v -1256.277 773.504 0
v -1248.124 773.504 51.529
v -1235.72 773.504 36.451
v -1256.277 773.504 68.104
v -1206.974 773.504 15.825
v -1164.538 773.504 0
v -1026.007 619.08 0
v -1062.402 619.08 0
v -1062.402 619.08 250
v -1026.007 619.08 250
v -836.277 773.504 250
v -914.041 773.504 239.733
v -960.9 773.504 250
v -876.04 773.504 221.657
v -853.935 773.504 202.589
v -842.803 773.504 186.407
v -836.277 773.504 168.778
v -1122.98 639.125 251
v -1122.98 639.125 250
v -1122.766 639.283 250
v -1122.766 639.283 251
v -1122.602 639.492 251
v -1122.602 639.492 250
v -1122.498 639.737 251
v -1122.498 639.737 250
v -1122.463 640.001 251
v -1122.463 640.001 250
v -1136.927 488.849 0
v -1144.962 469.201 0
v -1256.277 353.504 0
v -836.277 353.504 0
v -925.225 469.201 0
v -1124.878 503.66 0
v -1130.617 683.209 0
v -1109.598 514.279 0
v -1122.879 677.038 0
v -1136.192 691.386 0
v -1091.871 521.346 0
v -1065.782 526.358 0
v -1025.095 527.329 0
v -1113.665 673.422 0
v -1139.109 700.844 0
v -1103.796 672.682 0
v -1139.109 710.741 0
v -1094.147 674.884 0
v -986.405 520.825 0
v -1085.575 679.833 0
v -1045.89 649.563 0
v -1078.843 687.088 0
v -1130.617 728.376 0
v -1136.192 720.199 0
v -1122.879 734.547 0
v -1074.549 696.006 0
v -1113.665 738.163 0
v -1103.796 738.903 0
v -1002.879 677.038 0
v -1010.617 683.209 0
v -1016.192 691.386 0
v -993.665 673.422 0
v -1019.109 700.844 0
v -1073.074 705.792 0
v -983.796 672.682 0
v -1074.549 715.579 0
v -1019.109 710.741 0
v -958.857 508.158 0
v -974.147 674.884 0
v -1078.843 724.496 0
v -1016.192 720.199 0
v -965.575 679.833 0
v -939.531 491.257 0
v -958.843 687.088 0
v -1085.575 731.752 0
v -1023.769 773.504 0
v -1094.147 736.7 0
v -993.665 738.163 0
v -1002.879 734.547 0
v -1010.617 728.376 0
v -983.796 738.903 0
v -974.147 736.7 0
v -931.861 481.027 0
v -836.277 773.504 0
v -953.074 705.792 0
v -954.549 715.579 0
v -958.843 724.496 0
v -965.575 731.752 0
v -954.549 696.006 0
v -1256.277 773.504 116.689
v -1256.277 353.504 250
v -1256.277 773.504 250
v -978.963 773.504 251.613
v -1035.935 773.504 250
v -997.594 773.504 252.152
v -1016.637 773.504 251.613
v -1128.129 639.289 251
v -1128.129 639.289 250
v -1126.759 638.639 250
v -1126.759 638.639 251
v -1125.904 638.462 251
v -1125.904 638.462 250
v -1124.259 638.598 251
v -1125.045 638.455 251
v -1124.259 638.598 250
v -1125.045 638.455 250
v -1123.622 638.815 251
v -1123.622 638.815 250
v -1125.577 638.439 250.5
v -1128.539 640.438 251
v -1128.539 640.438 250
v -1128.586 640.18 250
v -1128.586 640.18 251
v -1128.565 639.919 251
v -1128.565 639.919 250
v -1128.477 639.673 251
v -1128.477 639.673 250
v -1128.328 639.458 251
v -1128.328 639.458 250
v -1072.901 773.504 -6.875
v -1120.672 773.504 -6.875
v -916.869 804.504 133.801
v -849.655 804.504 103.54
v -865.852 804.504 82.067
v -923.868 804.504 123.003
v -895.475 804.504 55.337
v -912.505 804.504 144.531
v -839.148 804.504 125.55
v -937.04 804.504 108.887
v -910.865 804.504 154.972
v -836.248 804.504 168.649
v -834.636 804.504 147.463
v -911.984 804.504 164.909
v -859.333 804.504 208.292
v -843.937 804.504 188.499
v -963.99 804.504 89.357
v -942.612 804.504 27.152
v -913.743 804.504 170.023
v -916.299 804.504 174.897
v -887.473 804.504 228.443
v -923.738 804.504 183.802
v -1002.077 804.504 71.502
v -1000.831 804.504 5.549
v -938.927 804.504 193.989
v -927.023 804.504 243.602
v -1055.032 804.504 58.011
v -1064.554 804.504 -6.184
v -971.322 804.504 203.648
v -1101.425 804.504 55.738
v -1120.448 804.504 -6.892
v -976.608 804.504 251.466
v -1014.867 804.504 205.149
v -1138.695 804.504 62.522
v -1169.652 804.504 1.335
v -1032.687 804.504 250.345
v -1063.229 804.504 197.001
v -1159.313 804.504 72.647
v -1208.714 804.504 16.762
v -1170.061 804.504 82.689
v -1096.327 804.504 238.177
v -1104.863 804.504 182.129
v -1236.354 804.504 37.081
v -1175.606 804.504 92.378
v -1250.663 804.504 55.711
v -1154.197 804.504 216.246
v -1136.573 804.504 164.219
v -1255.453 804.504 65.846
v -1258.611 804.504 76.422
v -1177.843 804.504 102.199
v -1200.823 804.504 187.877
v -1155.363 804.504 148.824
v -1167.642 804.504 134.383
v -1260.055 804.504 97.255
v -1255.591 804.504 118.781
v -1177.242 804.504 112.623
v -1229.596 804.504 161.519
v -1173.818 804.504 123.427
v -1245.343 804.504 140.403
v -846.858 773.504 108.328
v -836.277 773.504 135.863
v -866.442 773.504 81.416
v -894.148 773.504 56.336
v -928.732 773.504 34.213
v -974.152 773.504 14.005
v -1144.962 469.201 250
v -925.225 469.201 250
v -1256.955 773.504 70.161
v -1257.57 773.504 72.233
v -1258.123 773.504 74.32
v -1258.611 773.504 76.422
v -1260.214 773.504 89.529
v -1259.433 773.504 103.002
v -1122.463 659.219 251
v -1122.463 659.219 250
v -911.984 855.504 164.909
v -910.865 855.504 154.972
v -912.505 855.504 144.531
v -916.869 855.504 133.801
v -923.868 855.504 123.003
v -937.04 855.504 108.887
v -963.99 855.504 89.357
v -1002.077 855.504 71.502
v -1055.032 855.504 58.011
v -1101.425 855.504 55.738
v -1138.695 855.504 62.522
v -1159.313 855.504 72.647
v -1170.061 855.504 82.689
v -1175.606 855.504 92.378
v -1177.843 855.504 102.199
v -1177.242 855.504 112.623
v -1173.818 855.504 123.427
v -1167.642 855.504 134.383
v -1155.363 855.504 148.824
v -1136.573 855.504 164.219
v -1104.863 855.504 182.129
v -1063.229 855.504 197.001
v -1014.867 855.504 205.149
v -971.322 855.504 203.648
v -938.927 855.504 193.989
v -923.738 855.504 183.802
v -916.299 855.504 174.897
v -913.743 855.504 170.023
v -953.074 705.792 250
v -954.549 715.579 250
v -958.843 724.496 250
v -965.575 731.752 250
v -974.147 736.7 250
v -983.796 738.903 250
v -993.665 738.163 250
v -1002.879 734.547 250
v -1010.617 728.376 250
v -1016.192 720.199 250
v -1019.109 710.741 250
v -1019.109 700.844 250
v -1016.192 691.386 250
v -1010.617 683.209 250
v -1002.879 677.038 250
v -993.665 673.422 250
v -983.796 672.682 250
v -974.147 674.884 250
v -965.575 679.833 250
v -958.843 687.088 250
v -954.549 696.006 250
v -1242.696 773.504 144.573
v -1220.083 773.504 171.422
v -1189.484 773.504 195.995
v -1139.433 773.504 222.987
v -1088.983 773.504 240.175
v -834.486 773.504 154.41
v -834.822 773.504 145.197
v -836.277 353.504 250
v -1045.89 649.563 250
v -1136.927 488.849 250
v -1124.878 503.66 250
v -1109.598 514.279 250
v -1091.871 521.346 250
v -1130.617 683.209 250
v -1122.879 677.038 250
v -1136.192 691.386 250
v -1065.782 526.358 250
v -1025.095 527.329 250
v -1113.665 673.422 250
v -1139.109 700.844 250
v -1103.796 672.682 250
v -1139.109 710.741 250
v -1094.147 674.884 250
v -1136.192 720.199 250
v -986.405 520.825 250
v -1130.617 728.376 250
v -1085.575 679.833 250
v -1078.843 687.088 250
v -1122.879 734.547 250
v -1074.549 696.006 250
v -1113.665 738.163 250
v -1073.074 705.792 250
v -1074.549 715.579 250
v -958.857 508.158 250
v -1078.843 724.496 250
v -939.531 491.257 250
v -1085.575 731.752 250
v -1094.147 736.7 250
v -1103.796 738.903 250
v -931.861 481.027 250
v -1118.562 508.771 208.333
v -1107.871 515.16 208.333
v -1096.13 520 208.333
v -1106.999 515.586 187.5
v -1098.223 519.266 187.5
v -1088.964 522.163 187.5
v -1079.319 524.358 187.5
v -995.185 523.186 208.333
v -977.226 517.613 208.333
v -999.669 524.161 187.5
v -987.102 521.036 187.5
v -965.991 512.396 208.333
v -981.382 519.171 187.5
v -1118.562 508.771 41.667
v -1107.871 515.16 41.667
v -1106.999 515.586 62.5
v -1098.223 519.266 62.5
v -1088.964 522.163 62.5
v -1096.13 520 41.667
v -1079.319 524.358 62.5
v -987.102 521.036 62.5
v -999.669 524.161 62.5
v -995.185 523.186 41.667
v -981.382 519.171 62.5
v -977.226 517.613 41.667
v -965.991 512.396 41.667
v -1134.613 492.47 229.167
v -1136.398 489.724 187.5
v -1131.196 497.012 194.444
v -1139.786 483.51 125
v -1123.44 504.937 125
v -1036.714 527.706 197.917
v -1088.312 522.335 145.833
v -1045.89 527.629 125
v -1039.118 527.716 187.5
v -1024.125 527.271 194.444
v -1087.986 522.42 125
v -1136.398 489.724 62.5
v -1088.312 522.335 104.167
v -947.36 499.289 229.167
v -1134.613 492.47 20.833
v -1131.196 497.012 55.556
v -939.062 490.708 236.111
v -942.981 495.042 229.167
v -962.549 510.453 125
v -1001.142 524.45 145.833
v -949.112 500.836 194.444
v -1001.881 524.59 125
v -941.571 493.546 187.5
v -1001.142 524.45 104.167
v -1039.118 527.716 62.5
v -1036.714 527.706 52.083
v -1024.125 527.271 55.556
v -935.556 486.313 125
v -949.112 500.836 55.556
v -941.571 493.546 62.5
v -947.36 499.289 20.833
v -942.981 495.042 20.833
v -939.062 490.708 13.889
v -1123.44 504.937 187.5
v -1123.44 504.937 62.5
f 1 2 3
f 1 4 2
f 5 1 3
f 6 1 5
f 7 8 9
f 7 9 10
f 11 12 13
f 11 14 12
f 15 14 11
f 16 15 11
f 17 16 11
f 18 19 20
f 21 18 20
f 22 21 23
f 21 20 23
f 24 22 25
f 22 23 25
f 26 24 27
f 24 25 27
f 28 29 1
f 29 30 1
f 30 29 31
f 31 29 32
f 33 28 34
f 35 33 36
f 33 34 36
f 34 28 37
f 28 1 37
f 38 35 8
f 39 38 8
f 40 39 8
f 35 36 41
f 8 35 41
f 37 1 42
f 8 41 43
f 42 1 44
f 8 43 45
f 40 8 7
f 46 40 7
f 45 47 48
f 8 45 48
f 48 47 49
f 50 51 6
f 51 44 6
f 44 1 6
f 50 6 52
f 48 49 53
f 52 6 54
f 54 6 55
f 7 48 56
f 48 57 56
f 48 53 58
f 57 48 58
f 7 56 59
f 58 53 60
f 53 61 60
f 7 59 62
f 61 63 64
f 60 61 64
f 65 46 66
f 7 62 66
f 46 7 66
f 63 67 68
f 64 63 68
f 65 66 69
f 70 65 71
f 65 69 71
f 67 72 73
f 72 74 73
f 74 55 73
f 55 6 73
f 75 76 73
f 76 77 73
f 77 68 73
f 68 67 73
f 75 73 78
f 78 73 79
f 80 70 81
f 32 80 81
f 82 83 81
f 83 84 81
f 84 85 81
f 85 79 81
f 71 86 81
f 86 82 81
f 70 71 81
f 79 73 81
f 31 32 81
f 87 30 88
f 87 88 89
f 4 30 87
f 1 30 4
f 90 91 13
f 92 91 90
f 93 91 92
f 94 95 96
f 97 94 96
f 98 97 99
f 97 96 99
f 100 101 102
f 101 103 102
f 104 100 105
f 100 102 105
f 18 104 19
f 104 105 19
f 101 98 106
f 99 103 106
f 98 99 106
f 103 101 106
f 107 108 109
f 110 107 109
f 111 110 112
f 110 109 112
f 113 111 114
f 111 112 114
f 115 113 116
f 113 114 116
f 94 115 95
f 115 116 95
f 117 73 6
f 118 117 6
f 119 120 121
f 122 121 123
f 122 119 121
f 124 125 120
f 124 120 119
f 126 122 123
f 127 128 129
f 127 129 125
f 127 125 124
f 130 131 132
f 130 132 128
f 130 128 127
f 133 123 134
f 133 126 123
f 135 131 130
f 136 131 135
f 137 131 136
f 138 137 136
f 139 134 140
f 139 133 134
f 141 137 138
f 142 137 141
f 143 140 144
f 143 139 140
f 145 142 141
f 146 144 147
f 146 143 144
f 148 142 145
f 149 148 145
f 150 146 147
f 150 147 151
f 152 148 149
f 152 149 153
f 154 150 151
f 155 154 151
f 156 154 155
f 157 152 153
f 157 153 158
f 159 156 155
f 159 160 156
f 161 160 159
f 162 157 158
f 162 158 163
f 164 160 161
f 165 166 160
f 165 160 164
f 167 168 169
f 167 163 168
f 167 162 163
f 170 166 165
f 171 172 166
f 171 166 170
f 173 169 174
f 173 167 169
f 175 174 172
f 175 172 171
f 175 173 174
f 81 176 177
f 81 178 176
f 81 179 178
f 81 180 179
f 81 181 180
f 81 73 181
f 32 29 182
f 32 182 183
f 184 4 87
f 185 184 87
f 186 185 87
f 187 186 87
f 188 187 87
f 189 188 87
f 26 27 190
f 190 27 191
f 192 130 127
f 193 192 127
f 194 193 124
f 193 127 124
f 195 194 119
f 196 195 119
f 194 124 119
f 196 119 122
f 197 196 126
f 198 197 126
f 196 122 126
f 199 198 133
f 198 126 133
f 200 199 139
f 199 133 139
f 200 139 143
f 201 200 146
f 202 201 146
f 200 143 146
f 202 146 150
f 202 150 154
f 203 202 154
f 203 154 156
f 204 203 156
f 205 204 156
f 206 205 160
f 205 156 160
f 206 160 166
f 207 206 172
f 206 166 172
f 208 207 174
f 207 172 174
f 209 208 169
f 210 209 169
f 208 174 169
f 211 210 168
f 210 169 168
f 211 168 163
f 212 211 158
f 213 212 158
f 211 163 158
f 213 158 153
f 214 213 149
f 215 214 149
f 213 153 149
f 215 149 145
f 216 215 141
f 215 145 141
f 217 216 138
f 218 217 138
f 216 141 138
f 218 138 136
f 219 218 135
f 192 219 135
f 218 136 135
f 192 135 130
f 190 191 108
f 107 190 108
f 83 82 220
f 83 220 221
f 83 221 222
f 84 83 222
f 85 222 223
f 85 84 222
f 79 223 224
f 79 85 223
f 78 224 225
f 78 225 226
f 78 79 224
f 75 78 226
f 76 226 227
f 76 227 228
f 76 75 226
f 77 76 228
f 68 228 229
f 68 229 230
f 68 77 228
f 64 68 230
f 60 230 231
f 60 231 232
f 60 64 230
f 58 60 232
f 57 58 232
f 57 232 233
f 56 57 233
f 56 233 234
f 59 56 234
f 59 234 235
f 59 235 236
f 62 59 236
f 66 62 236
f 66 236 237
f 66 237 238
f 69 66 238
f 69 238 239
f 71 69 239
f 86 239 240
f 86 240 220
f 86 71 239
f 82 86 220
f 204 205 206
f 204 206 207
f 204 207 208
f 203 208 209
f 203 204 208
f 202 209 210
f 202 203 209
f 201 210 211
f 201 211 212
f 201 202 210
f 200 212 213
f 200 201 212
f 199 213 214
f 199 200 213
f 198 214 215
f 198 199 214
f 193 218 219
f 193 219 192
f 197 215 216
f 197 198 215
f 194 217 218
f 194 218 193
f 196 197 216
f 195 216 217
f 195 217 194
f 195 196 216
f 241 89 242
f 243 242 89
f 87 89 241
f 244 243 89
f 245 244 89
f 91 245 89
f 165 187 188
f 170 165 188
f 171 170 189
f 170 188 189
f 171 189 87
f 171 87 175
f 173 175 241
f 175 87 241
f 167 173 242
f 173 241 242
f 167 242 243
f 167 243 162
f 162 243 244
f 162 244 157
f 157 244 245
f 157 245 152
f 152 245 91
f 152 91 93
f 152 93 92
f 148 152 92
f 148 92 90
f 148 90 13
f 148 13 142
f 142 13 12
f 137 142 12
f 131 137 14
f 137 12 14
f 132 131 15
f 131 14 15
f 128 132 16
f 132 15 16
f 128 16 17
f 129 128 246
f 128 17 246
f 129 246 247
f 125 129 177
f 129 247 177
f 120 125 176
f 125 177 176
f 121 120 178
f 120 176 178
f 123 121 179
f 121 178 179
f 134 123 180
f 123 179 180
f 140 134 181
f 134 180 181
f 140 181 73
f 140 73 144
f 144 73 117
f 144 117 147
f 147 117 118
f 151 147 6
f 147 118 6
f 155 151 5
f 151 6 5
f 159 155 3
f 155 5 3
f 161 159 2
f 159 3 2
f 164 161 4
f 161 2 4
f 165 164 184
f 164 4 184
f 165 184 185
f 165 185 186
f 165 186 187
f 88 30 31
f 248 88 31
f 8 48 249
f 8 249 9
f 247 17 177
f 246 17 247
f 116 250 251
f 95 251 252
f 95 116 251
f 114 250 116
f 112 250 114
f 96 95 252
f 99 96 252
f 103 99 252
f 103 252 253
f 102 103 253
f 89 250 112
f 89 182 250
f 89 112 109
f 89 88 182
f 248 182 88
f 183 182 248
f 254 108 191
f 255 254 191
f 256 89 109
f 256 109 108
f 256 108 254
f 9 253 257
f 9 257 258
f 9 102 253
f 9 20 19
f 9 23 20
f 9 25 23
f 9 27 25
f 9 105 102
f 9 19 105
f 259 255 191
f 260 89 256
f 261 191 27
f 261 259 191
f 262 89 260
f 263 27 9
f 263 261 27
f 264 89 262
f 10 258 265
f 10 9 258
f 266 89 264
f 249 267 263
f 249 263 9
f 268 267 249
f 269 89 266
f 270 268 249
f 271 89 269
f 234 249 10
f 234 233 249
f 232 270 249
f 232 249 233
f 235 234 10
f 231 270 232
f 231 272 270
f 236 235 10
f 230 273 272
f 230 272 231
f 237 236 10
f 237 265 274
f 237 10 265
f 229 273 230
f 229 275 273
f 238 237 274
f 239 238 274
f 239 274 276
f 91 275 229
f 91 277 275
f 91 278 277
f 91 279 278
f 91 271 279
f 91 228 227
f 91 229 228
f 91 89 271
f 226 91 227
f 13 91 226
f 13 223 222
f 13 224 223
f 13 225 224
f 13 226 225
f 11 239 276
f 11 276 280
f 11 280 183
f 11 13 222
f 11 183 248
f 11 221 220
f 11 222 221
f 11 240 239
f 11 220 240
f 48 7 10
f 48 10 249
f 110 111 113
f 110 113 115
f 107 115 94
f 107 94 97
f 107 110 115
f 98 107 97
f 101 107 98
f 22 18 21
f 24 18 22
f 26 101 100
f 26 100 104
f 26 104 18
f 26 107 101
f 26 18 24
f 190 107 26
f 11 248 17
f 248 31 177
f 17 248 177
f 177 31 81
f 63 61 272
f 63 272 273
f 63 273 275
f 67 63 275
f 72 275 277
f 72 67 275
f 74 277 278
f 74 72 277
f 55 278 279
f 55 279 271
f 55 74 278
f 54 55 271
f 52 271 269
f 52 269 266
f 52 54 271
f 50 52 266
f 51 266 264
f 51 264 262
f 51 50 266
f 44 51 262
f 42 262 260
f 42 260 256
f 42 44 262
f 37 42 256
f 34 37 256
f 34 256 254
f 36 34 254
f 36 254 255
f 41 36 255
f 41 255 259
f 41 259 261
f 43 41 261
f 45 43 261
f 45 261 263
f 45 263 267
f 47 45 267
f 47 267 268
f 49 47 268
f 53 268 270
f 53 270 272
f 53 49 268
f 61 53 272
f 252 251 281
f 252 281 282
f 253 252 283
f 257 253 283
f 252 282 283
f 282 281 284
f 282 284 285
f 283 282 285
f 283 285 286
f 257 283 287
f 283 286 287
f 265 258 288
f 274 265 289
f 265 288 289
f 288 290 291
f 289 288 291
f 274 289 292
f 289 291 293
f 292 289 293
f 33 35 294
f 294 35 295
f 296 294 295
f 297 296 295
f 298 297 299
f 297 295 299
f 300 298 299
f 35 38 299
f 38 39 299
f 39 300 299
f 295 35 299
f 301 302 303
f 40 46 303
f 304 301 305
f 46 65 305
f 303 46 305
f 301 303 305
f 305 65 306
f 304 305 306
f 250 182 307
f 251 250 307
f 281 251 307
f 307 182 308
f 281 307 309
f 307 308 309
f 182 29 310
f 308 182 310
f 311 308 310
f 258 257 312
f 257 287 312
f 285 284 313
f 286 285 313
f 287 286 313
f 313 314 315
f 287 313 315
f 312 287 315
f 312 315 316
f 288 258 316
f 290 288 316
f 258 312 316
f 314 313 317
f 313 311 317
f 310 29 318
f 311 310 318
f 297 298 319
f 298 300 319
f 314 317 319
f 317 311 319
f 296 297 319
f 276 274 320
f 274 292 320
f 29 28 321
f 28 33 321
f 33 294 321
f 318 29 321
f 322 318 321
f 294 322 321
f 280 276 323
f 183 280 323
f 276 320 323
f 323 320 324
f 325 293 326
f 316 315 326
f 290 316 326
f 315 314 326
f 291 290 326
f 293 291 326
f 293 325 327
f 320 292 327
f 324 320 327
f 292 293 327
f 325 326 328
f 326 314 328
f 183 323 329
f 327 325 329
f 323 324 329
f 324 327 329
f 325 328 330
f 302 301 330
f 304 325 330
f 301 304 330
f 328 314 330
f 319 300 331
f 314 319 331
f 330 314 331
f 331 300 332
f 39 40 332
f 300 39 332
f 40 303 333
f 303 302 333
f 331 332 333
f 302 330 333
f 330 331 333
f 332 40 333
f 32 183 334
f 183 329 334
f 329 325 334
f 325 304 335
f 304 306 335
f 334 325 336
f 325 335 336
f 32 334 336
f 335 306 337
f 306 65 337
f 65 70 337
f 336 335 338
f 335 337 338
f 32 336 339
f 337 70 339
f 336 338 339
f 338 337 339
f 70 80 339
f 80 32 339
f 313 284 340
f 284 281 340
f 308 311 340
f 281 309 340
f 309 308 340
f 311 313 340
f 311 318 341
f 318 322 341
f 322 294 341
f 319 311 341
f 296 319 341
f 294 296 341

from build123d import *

# Parameters (mm, degrees)
SKETCH1_W           = 420
SKETCH1_H           = 420
SKETCH1_R           = 33.203133877
BOSS_EXTRUDE2_DEPTH = 250
BOSS_EXTRUDE3_DEPTH = 1
SKETCH4_RX          = 216.159218744
SKETCH4_RY          = 124.438636569
BOSS_EXTRUDE4_DEPTH = 31
SKETCH5_RX          = 136.808799133
SKETCH5_RY          = 69.0562156
BOSS_EXTRUDE5_DEPTH = 51


with BuildPart() as part:
    # Sketch1 → Boss-Extrude2 (new body)
    with BuildSketch(Plane.XY):
        with Locations((-1046.276969261, 563.504412843)):
            Rectangle(SKETCH1_W, SKETCH1_H)
        with Locations((-986.276969261, 705.792386227)):
            Circle(SKETCH1_R, mode=Mode.SUBTRACT)
        with Locations((-1106.276969261, 705.792386227)):
            Circle(SKETCH1_R, mode=Mode.SUBTRACT)
        Polygon((-1026.007137098, 619.07974314), (-1045.889944458, 649.563457617), (-1062.401956466, 619.07974314), align=None, mode=Mode.SUBTRACT)
        with BuildLine():
            Line((-1144.96201651, 469.201480292), (-925.225241317, 469.201480292))
            add(Edge.make_bspline(
                [(-1144.96201651, 469.201480292), (-1132.834759851, 516.055423689), (-1038.44686365, 538.622906956), (-948.523344563, 517.634809157), (-925.225241317, 469.201480292)],
                knots=[0, 0, 0, 0, 0.465700798, 1, 1, 1, 1], degree=3))
        make_face(mode=Mode.SUBTRACT)
    extrude(amount=BOSS_EXTRUDE2_DEPTH)

    # Sketch2 → Boss-Extrude3 (add)
    with BuildSketch(Plane.XY.offset(250)):
        with BuildLine():
            Line((-1122.462851099, 659.218542915), (-1128.539059101, 640.437536361))
            ThreePointArc((-1128.539059101, 640.437536361), (-1128.529323469, 639.793287222), (-1128.128635759, 639.288707105))
            add(Edge.make_bspline(
                [(-1128.128635759, 639.288707105), (-1127.290338361, 638.749430284), (-1125.582255263, 638.18298139), (-1123.857803216, 638.640795026), (-1122.979860291, 639.125064157)],
                knots=[0.103294074, 0.103294074, 0.103294074, 0.103294074, 0.51185707, 0.920052959, 0.920052959, 0.920052959, 0.920052959], degree=3))
            ThreePointArc((-1122.979860291, 639.125064157), (-1122.601749825, 639.492256106), (-1122.462851099, 640.000689579))
            Line((-1122.462851099, 640.000689579), (-1122.462851099, 659.218542915))
        make_face()
    extrude(amount=BOSS_EXTRUDE3_DEPTH)

    # Sketch4 → Boss-Extrude4 (add)
    with BuildSketch(Plane(origin=(0, 773.504412843, 0), x_dir=(1, 0, 0), z_dir=(0, 1, 0))):
        with Locations(Location((-1047.356098163, -122.204602032), (0, 0, 167.772053481))):
            Ellipse(SKETCH4_RX, SKETCH4_RY)
    extrude(amount=BOSS_EXTRUDE4_DEPTH)

    # Sketch5 → Boss-Extrude5 (add)
    with BuildSketch(Plane(origin=(0, 804.504412843, 0), x_dir=(1, 0, 0), z_dir=(0, 1, 0))):
        with Locations(Location((-1044.407129707, -130.546272111), (0, 0, -14.547039262))):
            Ellipse(SKETCH5_RX, SKETCH5_RY)
    extrude(amount=BOSS_EXTRUDE5_DEPTH)


solid = part.part
